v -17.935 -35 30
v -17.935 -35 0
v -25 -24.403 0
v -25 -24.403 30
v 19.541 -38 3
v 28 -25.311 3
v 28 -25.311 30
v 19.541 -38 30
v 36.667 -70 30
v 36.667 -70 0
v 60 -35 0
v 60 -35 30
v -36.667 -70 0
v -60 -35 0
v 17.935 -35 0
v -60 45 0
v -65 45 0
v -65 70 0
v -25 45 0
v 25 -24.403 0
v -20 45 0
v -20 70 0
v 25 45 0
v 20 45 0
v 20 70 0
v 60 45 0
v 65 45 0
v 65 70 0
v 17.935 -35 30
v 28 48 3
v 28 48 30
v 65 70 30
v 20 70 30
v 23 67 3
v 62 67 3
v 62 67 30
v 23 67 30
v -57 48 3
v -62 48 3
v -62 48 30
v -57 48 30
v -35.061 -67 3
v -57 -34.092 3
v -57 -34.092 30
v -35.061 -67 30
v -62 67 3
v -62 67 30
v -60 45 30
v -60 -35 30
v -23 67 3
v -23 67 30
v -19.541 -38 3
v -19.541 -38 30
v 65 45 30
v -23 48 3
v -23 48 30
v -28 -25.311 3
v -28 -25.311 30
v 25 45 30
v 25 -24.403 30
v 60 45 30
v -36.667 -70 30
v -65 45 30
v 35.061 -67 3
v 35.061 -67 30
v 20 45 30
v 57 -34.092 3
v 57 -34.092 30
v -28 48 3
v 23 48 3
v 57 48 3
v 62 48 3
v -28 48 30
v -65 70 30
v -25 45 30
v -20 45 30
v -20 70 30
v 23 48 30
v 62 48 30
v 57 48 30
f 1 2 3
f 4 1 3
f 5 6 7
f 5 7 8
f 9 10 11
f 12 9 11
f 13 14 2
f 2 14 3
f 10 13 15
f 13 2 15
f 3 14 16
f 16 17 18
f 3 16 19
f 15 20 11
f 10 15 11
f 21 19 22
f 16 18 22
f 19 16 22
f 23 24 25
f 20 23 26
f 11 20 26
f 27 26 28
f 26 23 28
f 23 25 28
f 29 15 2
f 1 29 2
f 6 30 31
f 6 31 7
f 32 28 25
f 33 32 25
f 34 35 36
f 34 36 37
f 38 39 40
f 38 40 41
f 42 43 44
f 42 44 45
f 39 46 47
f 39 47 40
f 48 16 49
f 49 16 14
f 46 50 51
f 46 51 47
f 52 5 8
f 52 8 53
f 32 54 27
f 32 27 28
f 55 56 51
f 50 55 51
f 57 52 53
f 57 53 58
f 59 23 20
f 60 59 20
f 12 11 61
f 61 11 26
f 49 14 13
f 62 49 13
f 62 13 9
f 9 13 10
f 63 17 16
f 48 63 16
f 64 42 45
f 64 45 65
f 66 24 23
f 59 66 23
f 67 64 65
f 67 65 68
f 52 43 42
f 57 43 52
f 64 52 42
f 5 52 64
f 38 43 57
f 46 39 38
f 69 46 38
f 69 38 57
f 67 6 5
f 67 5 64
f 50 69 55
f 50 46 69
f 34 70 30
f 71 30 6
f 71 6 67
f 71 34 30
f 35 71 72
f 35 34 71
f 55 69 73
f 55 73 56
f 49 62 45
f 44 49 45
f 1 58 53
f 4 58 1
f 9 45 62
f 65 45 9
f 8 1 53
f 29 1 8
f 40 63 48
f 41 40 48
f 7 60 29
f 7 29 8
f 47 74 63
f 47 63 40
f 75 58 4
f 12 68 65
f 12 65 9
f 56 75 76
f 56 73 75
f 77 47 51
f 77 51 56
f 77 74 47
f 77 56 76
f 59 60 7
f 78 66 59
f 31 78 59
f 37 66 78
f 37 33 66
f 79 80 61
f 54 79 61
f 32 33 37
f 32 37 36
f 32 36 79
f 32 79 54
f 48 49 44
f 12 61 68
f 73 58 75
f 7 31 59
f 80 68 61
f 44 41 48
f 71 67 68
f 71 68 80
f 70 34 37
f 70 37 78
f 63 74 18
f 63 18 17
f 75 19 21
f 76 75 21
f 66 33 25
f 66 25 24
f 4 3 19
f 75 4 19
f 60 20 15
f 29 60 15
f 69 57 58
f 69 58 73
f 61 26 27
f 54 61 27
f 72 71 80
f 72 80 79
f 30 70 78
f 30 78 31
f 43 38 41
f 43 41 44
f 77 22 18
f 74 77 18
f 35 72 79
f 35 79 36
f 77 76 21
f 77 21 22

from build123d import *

# Parameters (mm, degrees)
F1_DEPTH = 30
F2_T     = -3


with BuildPart() as f1:
    # F0 (on Top) → F1 (new body)
    with BuildSketch(Plane.XY):
        Polygon((-20, 70), (-65, 70), (-65, 45), (-60, 45), (-60, -35), (-36.6666666667, -70), (0, -70), (36.6666666667, -70), (60, -35), (60, 45), (65, 45), (65, 70), (20, 70), (20, 45), (25, 45), (25, -24.4028526794), (17.9352351196, -35), (0, -35), (-17.9352351196, -35), (-25, -24.4028526794), (-25, 45), (-20, 45), align=None)
    extrude(amount=F1_DEPTH)

    # F2
    f2_openings = [f1.faces().sort_by_distance(p)[0] for p in [
        (23.057247, -30.76118, 30),
    ]]
    offset(amount=F2_T, openings=f2_openings, kind=Kind.INTERSECTION)


solid = f1.part
